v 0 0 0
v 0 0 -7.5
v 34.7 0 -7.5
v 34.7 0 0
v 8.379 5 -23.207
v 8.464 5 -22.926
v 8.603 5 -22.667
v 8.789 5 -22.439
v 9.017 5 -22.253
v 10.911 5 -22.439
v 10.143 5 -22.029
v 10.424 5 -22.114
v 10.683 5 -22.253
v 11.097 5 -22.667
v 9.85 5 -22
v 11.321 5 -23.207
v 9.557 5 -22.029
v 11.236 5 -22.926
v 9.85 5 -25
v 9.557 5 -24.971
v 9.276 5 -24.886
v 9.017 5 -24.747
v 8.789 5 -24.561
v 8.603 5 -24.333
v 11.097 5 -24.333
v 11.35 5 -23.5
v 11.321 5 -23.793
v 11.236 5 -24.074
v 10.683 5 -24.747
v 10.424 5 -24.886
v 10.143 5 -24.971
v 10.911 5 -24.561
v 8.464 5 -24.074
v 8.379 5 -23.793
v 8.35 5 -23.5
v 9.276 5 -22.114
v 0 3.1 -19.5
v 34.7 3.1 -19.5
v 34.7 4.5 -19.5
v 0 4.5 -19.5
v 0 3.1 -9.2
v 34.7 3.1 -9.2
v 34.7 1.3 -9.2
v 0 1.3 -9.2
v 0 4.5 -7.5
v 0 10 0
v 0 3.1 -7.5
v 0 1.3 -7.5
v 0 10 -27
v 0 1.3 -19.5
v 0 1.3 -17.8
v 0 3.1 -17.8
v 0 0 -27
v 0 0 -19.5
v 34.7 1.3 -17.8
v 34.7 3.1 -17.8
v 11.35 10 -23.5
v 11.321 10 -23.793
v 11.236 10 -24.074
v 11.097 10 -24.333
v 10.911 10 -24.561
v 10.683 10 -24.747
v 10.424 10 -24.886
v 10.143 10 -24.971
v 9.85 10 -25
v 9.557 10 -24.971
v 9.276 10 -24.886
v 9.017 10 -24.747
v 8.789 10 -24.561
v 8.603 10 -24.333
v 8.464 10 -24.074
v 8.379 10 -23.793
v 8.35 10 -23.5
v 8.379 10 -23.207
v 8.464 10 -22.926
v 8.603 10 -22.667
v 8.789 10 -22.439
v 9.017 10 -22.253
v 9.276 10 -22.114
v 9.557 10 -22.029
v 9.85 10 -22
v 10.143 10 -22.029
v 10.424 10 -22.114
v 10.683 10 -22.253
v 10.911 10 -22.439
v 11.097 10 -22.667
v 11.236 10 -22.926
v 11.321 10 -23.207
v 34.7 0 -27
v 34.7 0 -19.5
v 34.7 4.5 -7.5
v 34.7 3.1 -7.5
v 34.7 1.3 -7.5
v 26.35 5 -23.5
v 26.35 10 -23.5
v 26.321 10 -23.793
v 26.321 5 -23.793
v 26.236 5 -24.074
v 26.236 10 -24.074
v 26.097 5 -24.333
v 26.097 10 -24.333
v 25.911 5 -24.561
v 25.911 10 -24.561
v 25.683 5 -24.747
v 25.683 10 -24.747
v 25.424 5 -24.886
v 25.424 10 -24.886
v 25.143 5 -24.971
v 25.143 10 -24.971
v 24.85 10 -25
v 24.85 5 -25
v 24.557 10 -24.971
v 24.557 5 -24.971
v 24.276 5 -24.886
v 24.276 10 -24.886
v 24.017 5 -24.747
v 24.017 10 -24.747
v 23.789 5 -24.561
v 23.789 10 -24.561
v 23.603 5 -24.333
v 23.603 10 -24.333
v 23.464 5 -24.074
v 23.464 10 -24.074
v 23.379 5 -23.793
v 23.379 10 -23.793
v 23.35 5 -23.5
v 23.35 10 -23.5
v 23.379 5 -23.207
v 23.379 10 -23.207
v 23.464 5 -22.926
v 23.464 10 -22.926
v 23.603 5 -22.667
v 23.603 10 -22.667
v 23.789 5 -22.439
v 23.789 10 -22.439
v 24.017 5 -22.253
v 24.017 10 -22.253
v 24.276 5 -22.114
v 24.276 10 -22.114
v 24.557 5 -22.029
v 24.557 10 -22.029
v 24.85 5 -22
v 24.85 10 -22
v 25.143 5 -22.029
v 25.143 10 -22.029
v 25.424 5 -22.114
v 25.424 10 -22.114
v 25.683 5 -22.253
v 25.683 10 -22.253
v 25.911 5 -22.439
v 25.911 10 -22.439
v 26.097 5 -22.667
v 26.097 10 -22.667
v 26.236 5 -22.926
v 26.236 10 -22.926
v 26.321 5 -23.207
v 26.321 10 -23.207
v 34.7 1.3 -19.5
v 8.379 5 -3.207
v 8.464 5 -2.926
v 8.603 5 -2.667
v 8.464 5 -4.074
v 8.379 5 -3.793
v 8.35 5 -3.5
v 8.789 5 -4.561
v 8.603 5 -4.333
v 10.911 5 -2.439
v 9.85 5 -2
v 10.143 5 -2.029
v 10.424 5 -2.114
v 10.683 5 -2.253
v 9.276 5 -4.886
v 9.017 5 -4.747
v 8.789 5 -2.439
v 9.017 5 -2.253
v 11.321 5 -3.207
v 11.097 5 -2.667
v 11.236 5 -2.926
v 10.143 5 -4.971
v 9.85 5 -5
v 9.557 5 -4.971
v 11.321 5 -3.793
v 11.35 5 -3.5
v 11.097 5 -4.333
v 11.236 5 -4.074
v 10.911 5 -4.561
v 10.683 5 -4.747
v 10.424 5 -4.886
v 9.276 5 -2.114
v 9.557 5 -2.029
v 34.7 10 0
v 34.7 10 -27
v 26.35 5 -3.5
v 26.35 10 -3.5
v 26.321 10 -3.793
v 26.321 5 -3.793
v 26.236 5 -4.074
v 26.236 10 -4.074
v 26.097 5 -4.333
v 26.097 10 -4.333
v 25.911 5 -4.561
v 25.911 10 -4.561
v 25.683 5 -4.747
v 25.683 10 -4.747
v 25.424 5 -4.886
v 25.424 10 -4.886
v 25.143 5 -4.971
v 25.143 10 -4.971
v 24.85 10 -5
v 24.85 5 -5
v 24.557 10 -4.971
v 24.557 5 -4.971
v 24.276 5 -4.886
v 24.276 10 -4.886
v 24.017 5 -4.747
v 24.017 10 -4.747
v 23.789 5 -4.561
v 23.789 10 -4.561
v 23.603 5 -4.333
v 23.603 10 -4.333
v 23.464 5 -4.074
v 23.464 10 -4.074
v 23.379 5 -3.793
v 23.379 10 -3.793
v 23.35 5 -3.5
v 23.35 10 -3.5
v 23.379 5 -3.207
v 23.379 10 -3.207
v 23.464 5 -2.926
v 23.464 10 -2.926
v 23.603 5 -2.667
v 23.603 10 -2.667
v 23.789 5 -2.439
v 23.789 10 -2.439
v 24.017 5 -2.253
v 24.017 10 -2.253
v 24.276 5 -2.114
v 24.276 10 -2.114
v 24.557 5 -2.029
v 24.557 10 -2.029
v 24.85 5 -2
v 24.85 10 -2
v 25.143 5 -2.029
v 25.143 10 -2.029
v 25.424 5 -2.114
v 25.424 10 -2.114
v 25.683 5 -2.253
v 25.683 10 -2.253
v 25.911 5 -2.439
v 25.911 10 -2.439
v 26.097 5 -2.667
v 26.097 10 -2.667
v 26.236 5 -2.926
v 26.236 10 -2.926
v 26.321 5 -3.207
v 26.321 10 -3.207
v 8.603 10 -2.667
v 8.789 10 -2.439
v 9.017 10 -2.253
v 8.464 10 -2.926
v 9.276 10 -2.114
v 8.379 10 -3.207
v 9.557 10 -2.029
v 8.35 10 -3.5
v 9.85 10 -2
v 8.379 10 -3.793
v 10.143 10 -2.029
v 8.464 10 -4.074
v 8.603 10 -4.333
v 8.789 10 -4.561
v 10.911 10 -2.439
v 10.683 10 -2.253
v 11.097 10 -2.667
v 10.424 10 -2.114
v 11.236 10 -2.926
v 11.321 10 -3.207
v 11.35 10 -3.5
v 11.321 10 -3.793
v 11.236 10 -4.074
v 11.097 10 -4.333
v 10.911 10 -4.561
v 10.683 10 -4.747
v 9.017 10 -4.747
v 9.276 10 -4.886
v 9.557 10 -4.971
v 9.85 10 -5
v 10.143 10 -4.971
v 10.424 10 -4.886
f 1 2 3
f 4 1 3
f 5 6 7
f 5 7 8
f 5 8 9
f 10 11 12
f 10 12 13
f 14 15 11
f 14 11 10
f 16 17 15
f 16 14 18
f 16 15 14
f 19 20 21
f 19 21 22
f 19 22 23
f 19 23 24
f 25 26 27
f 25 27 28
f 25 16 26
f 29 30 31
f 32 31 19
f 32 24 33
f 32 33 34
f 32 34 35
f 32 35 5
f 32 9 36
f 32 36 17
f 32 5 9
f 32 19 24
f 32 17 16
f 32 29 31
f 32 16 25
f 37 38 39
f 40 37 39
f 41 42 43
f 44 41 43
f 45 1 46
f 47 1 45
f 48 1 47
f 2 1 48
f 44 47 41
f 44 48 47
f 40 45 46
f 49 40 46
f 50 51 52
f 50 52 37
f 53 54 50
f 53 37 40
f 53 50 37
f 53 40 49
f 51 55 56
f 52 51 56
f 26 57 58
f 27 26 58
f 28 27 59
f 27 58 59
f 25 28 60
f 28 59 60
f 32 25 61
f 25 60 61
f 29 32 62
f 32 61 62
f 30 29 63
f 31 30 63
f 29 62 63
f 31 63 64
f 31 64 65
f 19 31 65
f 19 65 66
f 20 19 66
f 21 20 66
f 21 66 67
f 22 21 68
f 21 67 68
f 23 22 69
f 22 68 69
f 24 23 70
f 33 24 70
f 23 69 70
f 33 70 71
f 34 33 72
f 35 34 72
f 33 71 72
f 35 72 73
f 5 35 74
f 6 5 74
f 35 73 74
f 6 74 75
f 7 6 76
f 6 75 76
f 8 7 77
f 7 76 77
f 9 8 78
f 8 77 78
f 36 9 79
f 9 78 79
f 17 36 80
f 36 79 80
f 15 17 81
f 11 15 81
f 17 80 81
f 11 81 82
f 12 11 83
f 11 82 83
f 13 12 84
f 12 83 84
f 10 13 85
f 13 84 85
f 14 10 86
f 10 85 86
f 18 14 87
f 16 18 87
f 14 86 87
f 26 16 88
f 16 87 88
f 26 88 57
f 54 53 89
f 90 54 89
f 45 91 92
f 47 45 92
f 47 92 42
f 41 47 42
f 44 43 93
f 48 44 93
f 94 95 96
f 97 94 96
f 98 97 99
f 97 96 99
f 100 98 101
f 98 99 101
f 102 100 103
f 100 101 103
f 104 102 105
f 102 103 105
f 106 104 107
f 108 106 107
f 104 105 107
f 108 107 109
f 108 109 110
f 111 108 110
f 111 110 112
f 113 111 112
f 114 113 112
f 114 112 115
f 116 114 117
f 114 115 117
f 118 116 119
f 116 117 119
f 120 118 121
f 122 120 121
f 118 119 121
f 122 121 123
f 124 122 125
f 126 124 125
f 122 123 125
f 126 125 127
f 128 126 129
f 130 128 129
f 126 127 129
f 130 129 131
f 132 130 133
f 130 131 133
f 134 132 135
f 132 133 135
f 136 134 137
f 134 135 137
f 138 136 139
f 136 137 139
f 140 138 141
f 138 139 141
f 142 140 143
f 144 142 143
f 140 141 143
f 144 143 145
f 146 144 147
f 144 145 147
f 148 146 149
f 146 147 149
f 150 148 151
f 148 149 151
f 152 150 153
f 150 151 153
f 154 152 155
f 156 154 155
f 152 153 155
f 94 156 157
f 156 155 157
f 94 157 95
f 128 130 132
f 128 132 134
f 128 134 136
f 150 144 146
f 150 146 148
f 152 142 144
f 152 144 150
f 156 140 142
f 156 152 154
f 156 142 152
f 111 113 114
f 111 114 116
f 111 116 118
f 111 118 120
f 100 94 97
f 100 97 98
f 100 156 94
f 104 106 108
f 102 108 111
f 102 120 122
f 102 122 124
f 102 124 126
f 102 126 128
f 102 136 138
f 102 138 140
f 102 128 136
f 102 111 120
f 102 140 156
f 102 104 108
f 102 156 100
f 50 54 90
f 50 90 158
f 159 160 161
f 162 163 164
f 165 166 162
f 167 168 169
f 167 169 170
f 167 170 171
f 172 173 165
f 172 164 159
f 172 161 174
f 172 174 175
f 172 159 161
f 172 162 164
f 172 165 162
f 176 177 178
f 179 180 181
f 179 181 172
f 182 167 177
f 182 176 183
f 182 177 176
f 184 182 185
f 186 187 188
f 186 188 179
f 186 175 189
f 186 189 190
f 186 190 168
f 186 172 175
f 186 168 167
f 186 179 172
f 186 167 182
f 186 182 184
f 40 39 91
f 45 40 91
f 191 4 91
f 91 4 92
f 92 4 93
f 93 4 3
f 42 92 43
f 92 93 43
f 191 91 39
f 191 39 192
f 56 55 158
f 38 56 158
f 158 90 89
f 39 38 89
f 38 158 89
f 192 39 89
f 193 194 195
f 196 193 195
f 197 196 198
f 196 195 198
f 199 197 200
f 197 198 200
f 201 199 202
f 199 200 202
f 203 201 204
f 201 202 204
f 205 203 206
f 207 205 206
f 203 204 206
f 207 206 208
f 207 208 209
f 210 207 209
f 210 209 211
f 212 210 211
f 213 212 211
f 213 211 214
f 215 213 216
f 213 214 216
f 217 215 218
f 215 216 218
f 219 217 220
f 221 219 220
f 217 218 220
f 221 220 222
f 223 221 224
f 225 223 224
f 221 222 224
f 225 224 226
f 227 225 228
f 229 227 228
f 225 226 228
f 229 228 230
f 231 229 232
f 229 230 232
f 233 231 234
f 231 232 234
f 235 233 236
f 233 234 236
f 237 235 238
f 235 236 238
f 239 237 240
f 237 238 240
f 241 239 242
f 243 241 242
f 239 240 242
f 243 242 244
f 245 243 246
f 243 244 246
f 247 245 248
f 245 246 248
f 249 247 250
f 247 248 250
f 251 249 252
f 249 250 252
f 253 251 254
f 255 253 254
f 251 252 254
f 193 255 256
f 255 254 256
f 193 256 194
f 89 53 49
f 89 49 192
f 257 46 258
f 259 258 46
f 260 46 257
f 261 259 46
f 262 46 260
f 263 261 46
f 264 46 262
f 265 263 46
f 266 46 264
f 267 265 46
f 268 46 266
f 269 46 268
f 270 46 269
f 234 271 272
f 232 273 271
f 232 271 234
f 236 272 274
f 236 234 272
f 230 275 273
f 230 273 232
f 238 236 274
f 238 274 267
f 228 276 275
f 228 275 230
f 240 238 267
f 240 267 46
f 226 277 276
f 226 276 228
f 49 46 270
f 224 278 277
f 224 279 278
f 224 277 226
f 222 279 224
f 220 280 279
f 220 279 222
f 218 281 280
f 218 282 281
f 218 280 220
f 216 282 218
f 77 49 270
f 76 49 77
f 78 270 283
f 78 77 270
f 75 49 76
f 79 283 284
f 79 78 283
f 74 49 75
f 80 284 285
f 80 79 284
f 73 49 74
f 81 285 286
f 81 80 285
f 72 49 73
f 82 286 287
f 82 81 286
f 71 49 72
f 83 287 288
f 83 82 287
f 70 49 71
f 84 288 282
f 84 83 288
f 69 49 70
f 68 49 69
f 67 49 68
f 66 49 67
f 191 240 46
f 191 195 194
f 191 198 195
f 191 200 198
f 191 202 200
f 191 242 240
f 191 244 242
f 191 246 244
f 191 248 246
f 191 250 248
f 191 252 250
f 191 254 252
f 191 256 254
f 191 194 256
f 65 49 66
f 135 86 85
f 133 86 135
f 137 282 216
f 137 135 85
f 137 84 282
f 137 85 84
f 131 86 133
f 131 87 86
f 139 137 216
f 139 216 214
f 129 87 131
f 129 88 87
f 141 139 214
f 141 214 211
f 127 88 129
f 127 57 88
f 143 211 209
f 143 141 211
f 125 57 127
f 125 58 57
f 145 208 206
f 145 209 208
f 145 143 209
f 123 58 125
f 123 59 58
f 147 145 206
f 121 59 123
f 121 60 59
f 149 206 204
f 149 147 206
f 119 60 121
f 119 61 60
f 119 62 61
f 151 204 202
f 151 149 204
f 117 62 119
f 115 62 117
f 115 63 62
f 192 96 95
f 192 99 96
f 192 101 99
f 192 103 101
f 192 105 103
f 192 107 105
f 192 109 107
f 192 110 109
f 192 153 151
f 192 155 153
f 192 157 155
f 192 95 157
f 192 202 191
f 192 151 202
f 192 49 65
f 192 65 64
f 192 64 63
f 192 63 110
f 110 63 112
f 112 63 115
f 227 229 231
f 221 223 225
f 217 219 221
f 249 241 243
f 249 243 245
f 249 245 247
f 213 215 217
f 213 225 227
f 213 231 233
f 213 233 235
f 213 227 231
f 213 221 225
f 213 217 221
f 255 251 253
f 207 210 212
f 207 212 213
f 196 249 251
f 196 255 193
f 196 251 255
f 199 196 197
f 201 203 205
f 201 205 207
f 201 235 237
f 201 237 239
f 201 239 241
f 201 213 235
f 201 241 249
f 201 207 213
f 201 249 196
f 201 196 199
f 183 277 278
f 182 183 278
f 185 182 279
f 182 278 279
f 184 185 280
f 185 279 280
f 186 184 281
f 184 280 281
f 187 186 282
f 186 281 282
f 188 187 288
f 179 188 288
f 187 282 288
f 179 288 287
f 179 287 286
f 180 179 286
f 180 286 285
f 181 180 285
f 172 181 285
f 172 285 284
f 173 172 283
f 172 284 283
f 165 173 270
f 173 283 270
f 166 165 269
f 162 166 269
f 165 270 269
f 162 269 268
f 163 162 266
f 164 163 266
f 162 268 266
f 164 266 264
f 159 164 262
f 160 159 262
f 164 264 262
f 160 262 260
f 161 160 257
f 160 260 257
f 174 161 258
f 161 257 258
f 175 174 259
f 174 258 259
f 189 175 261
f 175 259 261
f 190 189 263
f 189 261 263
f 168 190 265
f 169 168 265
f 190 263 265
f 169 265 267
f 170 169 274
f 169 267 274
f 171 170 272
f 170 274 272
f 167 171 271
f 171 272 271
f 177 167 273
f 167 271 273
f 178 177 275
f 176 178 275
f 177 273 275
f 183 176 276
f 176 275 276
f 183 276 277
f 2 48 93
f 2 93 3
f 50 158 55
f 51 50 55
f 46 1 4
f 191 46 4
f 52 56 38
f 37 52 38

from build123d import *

# Parameters (mm, degrees)
CROQUIS1_W              = 34.7
CROQUIS1_H              = 27
SALIENTE_EXTRUIR1_DEPTH = 10
CROQUIS2_R              = 1.5
CORTAR_EXTRUIR1_DEPTH   = 5
CORTAR_EXTRUIR2_DEPTH   = 34.7


with BuildPart() as part:
    # Croquis1 → Saliente-Extruir1 (new body)
    with BuildSketch(Plane(origin=(0, 0, 0), x_dir=(1, 0, 0), z_dir=(0, 1, 0))):
        with Locations((17.35, 13.5)):
            Rectangle(CROQUIS1_W, CROQUIS1_H)
    extrude(amount=SALIENTE_EXTRUIR1_DEPTH)

    # Croquis2 → Cortar-Extruir1 (cut)
    with BuildSketch(Plane(origin=(0, 10, 0), x_dir=(1, 0, 0), z_dir=(0, 1, 0))):
        with Locations((9.85, 23.5)):
            Circle(CROQUIS2_R)
        with Locations((24.849986467, 23.5)):
            Circle(CROQUIS2_R)
        with Locations((9.85, 3.5)):
            Circle(CROQUIS2_R)
        with Locations((24.849986467, 3.5)):
            Circle(CROQUIS2_R)
    extrude(amount=-CORTAR_EXTRUIR1_DEPTH, mode=Mode.SUBTRACT)

    # Croquis3 → Cortar-Extruir2 (cut)
    with BuildSketch(Plane(origin=(34.7, 0, 0), x_dir=(0, 0, -1), z_dir=(1, 0, 0))):
        Polygon((7.5, 0), (19.5, 0), (19.5, 1.3), (17.8, 1.3), (17.8, 3.1), (19.5, 3.1), (19.5, 4.5), (7.5, 4.5), (7.5, 3.1), (9.2, 3.1), (9.2, 1.3), (7.5, 1.3), align=None)
    extrude(amount=-CORTAR_EXTRUIR2_DEPTH, mode=Mode.SUBTRACT)


solid = part.part
